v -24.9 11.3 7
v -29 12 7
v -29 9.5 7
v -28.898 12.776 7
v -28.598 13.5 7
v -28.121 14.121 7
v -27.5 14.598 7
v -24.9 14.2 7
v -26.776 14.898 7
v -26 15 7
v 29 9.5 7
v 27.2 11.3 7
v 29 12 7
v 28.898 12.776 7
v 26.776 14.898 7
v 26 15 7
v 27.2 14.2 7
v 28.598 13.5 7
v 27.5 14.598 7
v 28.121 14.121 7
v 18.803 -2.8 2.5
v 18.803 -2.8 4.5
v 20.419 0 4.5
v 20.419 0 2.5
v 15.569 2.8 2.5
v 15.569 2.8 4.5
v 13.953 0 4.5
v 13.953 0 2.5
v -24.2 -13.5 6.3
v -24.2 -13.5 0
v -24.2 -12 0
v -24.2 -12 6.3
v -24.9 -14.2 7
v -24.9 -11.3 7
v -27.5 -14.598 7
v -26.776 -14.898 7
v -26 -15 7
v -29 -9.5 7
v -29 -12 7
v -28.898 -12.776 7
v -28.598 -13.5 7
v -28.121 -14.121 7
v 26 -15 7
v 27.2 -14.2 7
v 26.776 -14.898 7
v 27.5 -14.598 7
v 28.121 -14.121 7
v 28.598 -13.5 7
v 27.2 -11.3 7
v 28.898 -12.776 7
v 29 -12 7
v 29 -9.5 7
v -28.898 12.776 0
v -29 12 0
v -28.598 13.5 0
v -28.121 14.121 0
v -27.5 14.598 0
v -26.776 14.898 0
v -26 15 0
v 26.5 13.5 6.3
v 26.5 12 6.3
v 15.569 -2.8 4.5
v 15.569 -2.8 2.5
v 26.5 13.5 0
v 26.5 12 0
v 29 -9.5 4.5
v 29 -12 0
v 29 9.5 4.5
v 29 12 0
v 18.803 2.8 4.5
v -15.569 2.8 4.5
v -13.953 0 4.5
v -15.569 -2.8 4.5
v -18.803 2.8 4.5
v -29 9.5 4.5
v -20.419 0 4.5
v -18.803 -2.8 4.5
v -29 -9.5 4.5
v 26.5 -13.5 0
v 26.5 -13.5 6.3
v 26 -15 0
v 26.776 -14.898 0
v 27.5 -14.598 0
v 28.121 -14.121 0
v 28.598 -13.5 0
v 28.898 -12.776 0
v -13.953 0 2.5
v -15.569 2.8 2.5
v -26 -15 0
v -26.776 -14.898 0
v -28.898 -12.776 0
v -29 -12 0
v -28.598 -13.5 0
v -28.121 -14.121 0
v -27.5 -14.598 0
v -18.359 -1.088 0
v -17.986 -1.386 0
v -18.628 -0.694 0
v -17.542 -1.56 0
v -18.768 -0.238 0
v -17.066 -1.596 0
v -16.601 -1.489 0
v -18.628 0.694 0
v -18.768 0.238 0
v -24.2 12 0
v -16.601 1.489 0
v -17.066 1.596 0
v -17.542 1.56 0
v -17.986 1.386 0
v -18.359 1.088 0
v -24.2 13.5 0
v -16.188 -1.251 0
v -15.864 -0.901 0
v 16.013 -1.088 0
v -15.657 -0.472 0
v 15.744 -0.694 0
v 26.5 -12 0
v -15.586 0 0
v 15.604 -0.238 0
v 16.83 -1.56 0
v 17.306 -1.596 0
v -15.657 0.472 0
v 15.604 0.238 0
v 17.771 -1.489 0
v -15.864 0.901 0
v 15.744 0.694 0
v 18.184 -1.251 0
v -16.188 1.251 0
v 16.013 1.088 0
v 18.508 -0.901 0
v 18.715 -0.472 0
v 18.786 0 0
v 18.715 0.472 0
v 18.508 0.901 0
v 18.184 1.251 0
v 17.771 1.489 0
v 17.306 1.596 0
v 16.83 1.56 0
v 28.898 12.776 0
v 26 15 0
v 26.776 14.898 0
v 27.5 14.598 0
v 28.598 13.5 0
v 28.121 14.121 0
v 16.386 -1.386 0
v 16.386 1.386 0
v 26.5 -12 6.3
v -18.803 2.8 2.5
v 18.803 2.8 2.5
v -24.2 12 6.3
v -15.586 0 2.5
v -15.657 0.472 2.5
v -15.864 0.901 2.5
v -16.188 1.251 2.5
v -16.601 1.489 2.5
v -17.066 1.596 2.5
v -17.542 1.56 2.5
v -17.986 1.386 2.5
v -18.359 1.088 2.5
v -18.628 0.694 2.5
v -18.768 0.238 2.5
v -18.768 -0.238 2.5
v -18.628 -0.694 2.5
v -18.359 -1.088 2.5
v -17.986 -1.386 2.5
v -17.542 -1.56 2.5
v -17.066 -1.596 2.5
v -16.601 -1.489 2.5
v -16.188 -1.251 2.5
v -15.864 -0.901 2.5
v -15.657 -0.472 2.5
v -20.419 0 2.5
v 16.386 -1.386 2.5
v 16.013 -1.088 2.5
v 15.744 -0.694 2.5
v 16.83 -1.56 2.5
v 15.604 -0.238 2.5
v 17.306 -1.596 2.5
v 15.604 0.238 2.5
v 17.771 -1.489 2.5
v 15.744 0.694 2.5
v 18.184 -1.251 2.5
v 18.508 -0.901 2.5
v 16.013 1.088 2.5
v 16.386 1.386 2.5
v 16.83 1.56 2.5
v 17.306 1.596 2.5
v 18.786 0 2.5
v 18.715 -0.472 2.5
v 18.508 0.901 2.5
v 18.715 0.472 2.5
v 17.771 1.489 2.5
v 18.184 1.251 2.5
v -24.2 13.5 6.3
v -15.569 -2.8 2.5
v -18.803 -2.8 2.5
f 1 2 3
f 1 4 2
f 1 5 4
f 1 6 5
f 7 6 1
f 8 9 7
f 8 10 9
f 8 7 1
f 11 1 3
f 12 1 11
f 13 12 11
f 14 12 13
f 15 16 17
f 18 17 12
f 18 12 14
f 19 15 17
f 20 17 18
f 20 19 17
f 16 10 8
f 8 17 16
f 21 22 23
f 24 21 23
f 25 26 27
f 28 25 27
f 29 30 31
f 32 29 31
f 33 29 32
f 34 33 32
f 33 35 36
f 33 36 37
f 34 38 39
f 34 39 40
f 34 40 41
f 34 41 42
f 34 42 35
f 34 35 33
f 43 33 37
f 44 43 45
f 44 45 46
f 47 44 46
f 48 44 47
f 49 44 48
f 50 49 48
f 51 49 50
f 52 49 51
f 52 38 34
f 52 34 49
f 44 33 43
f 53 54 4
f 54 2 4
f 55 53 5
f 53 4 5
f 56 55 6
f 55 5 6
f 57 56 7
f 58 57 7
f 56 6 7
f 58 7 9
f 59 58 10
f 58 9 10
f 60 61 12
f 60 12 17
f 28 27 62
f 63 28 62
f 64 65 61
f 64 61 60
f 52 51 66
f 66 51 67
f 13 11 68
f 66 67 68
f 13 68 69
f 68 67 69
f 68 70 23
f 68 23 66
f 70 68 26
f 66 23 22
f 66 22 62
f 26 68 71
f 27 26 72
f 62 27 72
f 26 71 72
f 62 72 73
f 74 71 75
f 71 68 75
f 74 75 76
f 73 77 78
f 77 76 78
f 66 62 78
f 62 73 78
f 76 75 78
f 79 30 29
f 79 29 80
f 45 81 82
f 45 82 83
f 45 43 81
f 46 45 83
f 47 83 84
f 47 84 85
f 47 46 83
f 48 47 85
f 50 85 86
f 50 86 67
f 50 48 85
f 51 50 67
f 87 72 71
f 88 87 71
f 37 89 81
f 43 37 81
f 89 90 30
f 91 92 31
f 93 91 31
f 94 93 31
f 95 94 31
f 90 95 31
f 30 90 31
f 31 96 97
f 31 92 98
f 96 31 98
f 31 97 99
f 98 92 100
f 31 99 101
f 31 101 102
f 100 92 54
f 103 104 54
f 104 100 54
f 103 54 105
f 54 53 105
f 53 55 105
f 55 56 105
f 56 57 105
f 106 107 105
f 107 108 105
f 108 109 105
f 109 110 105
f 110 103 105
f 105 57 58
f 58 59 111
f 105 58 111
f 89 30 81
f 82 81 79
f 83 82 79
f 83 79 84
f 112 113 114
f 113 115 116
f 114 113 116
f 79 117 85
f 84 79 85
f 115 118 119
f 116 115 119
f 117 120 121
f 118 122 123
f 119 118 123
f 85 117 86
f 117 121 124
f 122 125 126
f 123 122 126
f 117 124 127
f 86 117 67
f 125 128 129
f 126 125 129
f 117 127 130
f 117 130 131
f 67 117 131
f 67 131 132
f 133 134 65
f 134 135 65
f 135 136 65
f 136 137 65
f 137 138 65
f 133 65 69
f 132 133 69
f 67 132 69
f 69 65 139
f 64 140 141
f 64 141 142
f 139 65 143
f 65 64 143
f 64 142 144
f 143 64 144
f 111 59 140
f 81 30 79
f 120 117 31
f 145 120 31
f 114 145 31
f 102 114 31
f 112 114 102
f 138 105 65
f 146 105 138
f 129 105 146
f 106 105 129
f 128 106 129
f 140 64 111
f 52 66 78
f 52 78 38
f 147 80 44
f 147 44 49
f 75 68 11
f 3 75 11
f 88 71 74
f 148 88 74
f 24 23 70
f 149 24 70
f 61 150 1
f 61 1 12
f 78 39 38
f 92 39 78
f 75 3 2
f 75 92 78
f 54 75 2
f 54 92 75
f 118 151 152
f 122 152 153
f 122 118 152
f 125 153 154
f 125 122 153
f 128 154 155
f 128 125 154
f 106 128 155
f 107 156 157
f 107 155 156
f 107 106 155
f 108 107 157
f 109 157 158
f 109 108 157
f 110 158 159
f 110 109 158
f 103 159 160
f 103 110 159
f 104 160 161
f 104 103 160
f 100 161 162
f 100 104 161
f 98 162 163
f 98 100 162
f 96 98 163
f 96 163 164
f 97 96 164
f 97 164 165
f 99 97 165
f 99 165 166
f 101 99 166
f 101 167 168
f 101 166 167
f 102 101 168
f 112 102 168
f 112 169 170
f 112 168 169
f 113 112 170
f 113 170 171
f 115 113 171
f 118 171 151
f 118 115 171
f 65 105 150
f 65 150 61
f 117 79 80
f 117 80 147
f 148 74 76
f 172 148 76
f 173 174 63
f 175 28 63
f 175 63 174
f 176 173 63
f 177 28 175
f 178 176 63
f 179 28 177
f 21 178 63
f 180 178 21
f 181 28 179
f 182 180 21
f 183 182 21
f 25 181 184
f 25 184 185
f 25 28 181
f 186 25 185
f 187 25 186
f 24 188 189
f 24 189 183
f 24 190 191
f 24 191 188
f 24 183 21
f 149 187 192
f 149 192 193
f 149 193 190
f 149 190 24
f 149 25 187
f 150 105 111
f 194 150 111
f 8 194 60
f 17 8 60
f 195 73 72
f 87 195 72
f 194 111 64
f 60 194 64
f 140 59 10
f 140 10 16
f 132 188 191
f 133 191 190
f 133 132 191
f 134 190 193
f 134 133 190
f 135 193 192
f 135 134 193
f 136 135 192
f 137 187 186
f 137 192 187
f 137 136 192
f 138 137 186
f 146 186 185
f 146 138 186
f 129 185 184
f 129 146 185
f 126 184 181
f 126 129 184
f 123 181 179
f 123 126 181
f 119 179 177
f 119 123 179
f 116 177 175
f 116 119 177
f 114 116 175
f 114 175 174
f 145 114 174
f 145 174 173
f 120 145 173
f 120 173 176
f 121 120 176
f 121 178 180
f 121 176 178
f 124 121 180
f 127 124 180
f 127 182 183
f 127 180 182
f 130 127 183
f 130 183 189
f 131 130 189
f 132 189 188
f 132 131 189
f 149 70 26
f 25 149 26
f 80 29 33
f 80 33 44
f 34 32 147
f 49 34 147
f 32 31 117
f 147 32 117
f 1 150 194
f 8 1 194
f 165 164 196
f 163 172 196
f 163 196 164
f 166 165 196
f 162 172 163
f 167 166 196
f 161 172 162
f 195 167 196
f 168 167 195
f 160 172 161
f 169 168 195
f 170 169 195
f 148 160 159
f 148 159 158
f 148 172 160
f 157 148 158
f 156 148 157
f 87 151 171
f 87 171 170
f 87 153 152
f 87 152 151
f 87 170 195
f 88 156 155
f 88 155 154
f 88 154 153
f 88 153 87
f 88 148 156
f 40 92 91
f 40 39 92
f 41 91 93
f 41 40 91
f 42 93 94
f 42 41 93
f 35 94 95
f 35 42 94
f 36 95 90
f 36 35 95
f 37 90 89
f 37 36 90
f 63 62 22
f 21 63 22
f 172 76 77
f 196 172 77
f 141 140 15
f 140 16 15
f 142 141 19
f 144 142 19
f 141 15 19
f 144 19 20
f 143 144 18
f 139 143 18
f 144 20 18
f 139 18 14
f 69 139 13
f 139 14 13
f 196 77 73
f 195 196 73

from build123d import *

# Parameters (mm, degrees)
SKETCH_W        = 58
SKETCH_H        = 30
SKETCH_R        = 1.6
SKETCH_W_2      = 50.7
SKETCH_H_2      = 1.5
PAD_DEPTH       = 7
SKETCH001_W     = 19
SKETCH001_H     = 2.5
POCKET_DEPTH    = 58
POCKET001_DEPTH = 2
FILLET_R        = 3
CHAMFER_SIZE    = 0.7


with BuildPart() as part:
    # Sketch → Pad (new body)
    with BuildSketch(Plane.XY):
        Rectangle(SKETCH_W, SKETCH_H)
        with Locations((-17.186, 0)):
            Circle(SKETCH_R, mode=Mode.SUBTRACT)
        with Locations((17.186, 0)):
            Circle(SKETCH_R, mode=Mode.SUBTRACT)
        with Locations((1.15, 12.75)):
            Rectangle(SKETCH_W_2, SKETCH_H_2, mode=Mode.SUBTRACT)
        with Locations((1.15, -12.75)):
            Rectangle(SKETCH_W_2, SKETCH_H_2, mode=Mode.SUBTRACT)
    extrude(amount=PAD_DEPTH)

    # Sketch001 (on Face4 of Pad) → Pocket (cut)
    with BuildSketch(Plane(origin=(-29, 0, 0), x_dir=(0, -1, 0), z_dir=(-1, 0, 0))):
        with Locations((0, 5.75)):
            Rectangle(SKETCH001_W, SKETCH001_H)
    extrude(amount=-POCKET_DEPTH, mode=Mode.SUBTRACT)

    # Sketch002 (on Face7 of Pocket) → Pocket001 (cut)
    with BuildSketch(Plane.XY.offset(4.5)):
        Polygon((-15.569419, -2.8), (-13.952838, 0), (-15.569419, 2.8), (-18.802581, 2.8), (-20.419162, 0), (-18.802581, -2.8), align=None)
        Polygon((13.952838, 0), (15.569419, -2.8), (18.802581, -2.8), (20.419162, 0), (18.802581, 2.8), (15.569419, 2.8), align=None)
    extrude(amount=-POCKET001_DEPTH, mode=Mode.SUBTRACT)

    # Fillet
    fillet_edges = [part.edges().sort_by_distance(p)[0] for p in [
        (-29, -15, 3.5),
        (-29, 15, 3.5),
        (29, -15, 3.5),
        (29, 15, 3.5),
    ]]
    fillet(fillet_edges, radius=FILLET_R)

    # Chamfer
    chamfer_edges = [part.edges().sort_by_distance(p)[0] for p in [
        (1.15, -12, 7),
        (1.15, -13.5, 7),
        (26.5, -12.75, 7),
        (-24.2, -12.75, 7),
        (1.15, 13.5, 7),
        (1.15, 12, 7),
        (-24.2, 12.75, 7),
        (26.5, 12.75, 7),
    ]]
    chamfer(chamfer_edges, length=CHAMFER_SIZE)


solid = part.part
